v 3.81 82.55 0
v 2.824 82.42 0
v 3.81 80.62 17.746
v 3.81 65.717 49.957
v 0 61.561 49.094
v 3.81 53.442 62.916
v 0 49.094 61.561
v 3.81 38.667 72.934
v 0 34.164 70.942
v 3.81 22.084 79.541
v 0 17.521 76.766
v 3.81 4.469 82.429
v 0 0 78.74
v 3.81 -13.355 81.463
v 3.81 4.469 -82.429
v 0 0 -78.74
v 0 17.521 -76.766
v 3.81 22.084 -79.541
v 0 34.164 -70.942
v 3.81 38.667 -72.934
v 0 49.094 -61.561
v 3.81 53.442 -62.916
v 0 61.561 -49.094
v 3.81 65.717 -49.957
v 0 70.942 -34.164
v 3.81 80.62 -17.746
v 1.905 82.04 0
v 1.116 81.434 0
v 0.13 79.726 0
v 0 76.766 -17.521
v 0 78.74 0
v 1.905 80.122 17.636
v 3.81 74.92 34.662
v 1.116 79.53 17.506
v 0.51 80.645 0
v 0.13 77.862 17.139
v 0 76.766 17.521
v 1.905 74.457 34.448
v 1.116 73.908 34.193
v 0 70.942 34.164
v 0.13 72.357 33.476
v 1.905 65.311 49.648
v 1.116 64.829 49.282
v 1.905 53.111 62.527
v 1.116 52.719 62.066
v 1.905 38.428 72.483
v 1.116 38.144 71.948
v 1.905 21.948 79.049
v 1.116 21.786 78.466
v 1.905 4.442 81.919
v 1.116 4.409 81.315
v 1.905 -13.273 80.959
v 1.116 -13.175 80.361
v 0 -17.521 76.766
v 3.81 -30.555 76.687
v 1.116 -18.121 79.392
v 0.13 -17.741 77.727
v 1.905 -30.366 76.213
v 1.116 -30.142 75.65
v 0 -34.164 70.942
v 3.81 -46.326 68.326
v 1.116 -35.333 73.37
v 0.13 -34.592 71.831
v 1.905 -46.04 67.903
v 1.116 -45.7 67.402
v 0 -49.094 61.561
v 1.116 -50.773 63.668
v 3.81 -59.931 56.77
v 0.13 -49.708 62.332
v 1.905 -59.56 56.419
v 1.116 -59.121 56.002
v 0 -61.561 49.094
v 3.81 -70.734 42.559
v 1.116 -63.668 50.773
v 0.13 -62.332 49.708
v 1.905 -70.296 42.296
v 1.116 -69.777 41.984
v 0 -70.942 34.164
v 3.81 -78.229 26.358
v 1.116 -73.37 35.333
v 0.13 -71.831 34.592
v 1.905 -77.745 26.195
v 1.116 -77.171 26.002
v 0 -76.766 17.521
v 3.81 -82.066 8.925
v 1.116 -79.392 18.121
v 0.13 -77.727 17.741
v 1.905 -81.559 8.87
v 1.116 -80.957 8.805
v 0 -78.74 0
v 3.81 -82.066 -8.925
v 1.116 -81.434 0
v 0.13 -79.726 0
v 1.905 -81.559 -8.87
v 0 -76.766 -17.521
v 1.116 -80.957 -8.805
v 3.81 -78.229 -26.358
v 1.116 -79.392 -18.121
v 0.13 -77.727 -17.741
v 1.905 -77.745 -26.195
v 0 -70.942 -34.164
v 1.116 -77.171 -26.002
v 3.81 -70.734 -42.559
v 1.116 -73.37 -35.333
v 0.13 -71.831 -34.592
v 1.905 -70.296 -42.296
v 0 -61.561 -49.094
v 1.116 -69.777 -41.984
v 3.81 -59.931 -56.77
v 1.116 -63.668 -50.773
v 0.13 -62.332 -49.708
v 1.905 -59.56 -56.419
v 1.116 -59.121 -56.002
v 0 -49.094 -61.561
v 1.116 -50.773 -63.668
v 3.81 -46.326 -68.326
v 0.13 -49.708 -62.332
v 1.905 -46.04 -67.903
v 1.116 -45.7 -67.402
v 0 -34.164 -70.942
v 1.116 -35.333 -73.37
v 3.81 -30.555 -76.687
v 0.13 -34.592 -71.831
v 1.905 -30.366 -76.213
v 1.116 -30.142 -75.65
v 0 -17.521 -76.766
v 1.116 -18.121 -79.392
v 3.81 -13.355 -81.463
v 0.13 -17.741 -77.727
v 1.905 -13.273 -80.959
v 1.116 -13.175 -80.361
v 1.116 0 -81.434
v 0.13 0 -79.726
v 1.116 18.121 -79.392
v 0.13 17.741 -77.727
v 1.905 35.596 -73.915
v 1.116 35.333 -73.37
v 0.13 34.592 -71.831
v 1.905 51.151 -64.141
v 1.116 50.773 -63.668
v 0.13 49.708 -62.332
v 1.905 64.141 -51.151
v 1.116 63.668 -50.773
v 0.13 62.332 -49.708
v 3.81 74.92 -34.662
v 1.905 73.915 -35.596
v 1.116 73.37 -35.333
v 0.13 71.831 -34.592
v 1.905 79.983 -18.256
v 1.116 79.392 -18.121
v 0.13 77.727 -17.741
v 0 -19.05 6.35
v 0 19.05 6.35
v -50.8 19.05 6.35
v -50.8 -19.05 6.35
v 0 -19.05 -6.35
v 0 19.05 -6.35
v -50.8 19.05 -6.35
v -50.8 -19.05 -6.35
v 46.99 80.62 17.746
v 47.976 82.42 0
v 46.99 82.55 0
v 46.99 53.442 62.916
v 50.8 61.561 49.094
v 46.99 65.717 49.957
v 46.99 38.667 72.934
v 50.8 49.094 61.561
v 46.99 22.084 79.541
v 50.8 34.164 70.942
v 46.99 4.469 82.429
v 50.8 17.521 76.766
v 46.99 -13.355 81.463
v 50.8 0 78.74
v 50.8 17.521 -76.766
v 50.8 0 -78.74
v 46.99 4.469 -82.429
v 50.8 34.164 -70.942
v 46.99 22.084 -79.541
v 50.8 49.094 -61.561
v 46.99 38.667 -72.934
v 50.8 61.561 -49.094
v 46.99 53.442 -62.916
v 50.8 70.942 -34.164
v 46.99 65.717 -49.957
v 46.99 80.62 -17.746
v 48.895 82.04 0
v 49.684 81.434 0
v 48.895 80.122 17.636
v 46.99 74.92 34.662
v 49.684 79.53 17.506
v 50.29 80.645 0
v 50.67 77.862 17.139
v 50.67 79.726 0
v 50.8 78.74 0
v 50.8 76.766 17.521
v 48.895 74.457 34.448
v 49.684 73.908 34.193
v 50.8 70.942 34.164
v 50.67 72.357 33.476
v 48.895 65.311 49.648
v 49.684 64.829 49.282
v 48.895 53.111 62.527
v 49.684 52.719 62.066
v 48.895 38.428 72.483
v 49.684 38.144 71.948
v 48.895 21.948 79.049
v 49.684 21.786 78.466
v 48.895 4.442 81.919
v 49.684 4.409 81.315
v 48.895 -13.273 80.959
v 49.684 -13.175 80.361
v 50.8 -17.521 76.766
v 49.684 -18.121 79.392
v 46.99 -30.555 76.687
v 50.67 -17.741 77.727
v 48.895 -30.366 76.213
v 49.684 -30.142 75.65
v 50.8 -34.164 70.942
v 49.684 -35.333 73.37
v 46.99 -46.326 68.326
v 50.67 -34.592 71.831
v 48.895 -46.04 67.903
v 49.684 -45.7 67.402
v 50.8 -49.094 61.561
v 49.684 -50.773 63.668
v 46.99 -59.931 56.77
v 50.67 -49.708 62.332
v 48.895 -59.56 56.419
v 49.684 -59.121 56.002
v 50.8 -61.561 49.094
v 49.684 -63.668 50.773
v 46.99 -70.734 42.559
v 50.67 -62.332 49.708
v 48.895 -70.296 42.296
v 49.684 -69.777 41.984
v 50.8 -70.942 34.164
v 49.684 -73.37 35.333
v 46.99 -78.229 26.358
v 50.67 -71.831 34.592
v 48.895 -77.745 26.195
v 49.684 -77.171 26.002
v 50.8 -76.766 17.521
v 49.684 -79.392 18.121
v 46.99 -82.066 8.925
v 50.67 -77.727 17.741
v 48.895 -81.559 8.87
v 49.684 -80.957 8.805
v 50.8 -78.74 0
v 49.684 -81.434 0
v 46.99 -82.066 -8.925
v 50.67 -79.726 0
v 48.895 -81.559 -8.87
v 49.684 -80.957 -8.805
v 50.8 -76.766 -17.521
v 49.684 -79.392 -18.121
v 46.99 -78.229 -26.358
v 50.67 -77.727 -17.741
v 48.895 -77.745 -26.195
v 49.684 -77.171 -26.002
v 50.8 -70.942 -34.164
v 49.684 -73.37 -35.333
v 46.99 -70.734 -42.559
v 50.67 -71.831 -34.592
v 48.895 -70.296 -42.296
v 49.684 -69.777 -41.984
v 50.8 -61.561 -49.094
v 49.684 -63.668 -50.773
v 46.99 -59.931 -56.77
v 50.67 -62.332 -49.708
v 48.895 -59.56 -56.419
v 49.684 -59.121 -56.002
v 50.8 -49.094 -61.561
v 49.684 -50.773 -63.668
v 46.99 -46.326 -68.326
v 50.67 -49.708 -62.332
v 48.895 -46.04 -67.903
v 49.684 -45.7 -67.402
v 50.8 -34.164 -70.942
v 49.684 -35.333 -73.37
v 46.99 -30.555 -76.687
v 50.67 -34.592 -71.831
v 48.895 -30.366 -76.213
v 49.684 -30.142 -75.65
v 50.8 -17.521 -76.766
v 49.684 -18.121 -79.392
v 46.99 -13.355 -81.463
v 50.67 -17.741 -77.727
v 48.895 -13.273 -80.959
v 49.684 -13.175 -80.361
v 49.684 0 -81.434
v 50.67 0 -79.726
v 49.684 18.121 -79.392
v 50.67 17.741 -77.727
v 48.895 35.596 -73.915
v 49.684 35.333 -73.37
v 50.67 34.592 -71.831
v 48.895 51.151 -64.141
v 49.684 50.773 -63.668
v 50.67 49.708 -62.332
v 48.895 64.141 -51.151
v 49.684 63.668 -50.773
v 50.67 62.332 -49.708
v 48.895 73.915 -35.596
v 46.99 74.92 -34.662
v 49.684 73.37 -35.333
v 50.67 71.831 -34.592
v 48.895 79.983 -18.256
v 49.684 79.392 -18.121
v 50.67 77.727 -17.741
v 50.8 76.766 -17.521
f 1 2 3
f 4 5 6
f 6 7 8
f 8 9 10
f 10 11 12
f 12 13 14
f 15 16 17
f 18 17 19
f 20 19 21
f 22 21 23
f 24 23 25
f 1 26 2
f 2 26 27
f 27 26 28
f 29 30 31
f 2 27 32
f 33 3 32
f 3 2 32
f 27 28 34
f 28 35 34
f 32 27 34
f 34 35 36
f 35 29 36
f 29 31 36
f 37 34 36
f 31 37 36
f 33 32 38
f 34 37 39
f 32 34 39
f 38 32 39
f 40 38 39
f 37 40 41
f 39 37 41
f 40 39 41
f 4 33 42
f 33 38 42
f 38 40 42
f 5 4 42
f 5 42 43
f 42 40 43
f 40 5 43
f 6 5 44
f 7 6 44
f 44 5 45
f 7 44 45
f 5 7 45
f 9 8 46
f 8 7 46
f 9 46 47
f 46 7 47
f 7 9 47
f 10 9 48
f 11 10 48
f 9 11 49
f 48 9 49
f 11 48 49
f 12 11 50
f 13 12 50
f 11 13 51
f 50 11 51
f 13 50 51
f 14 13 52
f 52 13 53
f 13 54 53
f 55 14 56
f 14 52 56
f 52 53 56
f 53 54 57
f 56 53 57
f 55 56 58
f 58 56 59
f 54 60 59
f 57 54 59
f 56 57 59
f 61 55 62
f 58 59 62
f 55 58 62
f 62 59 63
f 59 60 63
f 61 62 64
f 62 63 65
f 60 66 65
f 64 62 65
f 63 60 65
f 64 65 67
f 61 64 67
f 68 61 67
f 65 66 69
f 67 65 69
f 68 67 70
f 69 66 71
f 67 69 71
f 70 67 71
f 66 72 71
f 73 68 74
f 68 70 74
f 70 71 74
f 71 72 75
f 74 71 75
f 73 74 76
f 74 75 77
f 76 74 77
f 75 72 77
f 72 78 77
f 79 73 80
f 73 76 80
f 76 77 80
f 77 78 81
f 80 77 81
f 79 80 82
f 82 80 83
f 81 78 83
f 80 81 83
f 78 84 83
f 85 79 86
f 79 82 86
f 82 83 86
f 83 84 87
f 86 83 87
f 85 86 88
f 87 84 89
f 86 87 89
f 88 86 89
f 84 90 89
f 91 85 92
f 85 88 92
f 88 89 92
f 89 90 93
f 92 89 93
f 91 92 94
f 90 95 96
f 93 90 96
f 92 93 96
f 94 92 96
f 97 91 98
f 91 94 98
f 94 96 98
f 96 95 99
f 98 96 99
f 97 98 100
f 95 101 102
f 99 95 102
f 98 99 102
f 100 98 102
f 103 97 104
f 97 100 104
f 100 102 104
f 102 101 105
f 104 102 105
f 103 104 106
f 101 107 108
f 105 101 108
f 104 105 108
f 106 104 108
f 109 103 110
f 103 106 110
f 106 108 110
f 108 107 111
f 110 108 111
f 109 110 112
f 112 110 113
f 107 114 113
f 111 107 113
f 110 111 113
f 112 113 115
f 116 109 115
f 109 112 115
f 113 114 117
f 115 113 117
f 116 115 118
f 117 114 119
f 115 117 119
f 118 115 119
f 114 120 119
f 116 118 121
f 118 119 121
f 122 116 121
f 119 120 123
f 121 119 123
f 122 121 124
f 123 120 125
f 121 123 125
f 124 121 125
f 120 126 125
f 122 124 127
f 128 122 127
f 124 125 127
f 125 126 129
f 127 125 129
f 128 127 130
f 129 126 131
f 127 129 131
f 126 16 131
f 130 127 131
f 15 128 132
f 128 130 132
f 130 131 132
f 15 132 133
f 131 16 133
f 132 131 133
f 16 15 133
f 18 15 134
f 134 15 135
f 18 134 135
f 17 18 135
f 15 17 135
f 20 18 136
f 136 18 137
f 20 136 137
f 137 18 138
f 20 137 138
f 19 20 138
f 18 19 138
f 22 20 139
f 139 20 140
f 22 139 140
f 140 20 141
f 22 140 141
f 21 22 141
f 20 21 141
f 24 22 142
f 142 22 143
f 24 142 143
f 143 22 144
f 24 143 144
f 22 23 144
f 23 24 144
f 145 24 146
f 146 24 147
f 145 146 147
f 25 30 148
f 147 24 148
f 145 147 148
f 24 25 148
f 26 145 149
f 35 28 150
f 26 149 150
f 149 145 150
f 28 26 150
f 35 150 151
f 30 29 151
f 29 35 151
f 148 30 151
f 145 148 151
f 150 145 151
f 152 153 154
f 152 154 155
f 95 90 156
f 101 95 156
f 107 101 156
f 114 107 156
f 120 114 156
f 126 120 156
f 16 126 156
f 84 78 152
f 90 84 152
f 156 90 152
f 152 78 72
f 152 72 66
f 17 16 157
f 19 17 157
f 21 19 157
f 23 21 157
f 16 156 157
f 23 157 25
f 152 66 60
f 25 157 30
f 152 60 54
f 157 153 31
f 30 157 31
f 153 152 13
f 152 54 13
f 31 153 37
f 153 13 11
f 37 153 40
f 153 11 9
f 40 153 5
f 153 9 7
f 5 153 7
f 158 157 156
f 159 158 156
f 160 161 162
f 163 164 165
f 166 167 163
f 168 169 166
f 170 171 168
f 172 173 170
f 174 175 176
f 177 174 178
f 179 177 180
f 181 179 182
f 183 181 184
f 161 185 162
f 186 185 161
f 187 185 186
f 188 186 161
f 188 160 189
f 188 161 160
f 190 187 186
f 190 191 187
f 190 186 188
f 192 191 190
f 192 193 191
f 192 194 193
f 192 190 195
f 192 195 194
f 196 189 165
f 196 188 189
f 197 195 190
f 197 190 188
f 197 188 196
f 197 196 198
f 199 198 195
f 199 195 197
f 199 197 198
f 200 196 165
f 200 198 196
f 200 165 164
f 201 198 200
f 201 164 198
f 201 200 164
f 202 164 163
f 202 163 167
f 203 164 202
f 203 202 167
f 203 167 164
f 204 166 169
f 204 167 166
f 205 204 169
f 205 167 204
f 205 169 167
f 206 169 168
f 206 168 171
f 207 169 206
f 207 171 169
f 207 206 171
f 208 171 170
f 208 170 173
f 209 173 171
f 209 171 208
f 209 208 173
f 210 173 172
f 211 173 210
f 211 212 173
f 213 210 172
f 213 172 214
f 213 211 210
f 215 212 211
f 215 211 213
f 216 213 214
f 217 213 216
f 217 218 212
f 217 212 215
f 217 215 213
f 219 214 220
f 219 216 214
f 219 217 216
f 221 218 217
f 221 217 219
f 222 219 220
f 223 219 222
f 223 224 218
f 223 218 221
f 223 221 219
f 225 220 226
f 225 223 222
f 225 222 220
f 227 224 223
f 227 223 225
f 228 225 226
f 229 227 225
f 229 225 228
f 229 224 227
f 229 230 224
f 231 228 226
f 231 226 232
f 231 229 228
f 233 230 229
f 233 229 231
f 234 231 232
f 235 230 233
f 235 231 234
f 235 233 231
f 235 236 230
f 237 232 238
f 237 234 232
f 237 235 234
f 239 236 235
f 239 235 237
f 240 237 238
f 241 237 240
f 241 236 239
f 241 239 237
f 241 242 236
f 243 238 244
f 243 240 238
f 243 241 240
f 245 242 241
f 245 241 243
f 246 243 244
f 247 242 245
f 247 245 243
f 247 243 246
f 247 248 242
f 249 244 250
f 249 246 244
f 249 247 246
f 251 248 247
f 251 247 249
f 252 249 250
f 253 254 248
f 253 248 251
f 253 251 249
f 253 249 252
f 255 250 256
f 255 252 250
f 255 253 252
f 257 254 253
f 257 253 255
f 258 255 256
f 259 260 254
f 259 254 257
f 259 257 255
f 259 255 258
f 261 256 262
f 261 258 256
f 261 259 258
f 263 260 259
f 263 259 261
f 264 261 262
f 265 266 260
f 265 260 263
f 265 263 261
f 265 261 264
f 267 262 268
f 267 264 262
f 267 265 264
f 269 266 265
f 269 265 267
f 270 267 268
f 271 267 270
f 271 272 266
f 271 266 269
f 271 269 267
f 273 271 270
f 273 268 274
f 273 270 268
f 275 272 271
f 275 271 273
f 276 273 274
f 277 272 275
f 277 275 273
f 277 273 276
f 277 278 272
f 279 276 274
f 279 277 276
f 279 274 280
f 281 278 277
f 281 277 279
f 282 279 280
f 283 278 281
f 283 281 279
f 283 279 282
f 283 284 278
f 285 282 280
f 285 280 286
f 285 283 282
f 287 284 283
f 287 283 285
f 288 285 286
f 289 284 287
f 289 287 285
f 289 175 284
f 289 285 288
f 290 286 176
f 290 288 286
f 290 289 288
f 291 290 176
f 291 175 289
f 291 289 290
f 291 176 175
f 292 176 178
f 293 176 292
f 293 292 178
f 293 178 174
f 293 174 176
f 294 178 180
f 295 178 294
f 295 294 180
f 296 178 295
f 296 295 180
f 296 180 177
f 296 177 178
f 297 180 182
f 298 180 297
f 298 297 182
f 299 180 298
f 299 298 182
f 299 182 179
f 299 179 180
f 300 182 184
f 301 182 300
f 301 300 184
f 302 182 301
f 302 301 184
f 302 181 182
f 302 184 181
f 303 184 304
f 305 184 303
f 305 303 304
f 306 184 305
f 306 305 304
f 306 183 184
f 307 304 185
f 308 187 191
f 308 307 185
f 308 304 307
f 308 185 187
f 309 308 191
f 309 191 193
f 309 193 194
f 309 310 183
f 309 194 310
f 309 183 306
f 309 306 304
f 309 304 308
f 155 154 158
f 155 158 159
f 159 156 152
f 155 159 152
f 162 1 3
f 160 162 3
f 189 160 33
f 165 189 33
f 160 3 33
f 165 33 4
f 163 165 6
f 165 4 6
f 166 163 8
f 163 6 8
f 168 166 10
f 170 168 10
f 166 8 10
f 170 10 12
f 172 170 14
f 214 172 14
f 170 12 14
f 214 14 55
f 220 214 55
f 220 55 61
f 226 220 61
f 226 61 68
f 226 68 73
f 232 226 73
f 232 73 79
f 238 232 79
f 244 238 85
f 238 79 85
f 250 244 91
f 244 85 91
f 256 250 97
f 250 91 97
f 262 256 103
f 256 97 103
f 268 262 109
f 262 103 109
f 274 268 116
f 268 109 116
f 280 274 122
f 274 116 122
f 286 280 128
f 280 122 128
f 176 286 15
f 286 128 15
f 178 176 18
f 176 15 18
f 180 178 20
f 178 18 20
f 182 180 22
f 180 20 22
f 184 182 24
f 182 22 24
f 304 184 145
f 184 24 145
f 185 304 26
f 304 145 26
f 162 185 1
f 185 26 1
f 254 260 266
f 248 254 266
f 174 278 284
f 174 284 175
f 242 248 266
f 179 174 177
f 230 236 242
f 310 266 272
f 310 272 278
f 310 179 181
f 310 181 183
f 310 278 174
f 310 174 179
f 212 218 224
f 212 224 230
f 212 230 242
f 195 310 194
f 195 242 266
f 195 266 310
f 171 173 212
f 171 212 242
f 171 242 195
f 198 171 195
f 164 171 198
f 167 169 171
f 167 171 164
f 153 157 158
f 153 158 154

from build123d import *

# Parameters (mm, degrees)
F0_R     = 82.55
F1_DEPTH = 50.8
F2_R     = 3.81
F3_W     = 38.1
F3_H     = 12.7
F4_DEPTH = 50.8


with BuildPart() as f1:
    # F0 (on Right) → F1 (new body)
    with BuildSketch(Plane.YZ):
        Circle(F0_R)
    extrude(amount=F1_DEPTH)

    # F2
    f2_edges = [f1.edges().sort_by_distance(p)[0] for p in [
        (50.8, -82.55, 0),
        (0, -82.55, 0),
    ]]
    fillet(f2_edges, radius=F2_R)

    # F3 (on face) → F4 (join)
    with BuildSketch(Plane(origin=(0, 0, 0), x_dir=(0, -1, 0), z_dir=(-1, 0, 0))):
        Rectangle(F3_W, F3_H)
    extrude(amount=F4_DEPTH)


solid = f1.part
